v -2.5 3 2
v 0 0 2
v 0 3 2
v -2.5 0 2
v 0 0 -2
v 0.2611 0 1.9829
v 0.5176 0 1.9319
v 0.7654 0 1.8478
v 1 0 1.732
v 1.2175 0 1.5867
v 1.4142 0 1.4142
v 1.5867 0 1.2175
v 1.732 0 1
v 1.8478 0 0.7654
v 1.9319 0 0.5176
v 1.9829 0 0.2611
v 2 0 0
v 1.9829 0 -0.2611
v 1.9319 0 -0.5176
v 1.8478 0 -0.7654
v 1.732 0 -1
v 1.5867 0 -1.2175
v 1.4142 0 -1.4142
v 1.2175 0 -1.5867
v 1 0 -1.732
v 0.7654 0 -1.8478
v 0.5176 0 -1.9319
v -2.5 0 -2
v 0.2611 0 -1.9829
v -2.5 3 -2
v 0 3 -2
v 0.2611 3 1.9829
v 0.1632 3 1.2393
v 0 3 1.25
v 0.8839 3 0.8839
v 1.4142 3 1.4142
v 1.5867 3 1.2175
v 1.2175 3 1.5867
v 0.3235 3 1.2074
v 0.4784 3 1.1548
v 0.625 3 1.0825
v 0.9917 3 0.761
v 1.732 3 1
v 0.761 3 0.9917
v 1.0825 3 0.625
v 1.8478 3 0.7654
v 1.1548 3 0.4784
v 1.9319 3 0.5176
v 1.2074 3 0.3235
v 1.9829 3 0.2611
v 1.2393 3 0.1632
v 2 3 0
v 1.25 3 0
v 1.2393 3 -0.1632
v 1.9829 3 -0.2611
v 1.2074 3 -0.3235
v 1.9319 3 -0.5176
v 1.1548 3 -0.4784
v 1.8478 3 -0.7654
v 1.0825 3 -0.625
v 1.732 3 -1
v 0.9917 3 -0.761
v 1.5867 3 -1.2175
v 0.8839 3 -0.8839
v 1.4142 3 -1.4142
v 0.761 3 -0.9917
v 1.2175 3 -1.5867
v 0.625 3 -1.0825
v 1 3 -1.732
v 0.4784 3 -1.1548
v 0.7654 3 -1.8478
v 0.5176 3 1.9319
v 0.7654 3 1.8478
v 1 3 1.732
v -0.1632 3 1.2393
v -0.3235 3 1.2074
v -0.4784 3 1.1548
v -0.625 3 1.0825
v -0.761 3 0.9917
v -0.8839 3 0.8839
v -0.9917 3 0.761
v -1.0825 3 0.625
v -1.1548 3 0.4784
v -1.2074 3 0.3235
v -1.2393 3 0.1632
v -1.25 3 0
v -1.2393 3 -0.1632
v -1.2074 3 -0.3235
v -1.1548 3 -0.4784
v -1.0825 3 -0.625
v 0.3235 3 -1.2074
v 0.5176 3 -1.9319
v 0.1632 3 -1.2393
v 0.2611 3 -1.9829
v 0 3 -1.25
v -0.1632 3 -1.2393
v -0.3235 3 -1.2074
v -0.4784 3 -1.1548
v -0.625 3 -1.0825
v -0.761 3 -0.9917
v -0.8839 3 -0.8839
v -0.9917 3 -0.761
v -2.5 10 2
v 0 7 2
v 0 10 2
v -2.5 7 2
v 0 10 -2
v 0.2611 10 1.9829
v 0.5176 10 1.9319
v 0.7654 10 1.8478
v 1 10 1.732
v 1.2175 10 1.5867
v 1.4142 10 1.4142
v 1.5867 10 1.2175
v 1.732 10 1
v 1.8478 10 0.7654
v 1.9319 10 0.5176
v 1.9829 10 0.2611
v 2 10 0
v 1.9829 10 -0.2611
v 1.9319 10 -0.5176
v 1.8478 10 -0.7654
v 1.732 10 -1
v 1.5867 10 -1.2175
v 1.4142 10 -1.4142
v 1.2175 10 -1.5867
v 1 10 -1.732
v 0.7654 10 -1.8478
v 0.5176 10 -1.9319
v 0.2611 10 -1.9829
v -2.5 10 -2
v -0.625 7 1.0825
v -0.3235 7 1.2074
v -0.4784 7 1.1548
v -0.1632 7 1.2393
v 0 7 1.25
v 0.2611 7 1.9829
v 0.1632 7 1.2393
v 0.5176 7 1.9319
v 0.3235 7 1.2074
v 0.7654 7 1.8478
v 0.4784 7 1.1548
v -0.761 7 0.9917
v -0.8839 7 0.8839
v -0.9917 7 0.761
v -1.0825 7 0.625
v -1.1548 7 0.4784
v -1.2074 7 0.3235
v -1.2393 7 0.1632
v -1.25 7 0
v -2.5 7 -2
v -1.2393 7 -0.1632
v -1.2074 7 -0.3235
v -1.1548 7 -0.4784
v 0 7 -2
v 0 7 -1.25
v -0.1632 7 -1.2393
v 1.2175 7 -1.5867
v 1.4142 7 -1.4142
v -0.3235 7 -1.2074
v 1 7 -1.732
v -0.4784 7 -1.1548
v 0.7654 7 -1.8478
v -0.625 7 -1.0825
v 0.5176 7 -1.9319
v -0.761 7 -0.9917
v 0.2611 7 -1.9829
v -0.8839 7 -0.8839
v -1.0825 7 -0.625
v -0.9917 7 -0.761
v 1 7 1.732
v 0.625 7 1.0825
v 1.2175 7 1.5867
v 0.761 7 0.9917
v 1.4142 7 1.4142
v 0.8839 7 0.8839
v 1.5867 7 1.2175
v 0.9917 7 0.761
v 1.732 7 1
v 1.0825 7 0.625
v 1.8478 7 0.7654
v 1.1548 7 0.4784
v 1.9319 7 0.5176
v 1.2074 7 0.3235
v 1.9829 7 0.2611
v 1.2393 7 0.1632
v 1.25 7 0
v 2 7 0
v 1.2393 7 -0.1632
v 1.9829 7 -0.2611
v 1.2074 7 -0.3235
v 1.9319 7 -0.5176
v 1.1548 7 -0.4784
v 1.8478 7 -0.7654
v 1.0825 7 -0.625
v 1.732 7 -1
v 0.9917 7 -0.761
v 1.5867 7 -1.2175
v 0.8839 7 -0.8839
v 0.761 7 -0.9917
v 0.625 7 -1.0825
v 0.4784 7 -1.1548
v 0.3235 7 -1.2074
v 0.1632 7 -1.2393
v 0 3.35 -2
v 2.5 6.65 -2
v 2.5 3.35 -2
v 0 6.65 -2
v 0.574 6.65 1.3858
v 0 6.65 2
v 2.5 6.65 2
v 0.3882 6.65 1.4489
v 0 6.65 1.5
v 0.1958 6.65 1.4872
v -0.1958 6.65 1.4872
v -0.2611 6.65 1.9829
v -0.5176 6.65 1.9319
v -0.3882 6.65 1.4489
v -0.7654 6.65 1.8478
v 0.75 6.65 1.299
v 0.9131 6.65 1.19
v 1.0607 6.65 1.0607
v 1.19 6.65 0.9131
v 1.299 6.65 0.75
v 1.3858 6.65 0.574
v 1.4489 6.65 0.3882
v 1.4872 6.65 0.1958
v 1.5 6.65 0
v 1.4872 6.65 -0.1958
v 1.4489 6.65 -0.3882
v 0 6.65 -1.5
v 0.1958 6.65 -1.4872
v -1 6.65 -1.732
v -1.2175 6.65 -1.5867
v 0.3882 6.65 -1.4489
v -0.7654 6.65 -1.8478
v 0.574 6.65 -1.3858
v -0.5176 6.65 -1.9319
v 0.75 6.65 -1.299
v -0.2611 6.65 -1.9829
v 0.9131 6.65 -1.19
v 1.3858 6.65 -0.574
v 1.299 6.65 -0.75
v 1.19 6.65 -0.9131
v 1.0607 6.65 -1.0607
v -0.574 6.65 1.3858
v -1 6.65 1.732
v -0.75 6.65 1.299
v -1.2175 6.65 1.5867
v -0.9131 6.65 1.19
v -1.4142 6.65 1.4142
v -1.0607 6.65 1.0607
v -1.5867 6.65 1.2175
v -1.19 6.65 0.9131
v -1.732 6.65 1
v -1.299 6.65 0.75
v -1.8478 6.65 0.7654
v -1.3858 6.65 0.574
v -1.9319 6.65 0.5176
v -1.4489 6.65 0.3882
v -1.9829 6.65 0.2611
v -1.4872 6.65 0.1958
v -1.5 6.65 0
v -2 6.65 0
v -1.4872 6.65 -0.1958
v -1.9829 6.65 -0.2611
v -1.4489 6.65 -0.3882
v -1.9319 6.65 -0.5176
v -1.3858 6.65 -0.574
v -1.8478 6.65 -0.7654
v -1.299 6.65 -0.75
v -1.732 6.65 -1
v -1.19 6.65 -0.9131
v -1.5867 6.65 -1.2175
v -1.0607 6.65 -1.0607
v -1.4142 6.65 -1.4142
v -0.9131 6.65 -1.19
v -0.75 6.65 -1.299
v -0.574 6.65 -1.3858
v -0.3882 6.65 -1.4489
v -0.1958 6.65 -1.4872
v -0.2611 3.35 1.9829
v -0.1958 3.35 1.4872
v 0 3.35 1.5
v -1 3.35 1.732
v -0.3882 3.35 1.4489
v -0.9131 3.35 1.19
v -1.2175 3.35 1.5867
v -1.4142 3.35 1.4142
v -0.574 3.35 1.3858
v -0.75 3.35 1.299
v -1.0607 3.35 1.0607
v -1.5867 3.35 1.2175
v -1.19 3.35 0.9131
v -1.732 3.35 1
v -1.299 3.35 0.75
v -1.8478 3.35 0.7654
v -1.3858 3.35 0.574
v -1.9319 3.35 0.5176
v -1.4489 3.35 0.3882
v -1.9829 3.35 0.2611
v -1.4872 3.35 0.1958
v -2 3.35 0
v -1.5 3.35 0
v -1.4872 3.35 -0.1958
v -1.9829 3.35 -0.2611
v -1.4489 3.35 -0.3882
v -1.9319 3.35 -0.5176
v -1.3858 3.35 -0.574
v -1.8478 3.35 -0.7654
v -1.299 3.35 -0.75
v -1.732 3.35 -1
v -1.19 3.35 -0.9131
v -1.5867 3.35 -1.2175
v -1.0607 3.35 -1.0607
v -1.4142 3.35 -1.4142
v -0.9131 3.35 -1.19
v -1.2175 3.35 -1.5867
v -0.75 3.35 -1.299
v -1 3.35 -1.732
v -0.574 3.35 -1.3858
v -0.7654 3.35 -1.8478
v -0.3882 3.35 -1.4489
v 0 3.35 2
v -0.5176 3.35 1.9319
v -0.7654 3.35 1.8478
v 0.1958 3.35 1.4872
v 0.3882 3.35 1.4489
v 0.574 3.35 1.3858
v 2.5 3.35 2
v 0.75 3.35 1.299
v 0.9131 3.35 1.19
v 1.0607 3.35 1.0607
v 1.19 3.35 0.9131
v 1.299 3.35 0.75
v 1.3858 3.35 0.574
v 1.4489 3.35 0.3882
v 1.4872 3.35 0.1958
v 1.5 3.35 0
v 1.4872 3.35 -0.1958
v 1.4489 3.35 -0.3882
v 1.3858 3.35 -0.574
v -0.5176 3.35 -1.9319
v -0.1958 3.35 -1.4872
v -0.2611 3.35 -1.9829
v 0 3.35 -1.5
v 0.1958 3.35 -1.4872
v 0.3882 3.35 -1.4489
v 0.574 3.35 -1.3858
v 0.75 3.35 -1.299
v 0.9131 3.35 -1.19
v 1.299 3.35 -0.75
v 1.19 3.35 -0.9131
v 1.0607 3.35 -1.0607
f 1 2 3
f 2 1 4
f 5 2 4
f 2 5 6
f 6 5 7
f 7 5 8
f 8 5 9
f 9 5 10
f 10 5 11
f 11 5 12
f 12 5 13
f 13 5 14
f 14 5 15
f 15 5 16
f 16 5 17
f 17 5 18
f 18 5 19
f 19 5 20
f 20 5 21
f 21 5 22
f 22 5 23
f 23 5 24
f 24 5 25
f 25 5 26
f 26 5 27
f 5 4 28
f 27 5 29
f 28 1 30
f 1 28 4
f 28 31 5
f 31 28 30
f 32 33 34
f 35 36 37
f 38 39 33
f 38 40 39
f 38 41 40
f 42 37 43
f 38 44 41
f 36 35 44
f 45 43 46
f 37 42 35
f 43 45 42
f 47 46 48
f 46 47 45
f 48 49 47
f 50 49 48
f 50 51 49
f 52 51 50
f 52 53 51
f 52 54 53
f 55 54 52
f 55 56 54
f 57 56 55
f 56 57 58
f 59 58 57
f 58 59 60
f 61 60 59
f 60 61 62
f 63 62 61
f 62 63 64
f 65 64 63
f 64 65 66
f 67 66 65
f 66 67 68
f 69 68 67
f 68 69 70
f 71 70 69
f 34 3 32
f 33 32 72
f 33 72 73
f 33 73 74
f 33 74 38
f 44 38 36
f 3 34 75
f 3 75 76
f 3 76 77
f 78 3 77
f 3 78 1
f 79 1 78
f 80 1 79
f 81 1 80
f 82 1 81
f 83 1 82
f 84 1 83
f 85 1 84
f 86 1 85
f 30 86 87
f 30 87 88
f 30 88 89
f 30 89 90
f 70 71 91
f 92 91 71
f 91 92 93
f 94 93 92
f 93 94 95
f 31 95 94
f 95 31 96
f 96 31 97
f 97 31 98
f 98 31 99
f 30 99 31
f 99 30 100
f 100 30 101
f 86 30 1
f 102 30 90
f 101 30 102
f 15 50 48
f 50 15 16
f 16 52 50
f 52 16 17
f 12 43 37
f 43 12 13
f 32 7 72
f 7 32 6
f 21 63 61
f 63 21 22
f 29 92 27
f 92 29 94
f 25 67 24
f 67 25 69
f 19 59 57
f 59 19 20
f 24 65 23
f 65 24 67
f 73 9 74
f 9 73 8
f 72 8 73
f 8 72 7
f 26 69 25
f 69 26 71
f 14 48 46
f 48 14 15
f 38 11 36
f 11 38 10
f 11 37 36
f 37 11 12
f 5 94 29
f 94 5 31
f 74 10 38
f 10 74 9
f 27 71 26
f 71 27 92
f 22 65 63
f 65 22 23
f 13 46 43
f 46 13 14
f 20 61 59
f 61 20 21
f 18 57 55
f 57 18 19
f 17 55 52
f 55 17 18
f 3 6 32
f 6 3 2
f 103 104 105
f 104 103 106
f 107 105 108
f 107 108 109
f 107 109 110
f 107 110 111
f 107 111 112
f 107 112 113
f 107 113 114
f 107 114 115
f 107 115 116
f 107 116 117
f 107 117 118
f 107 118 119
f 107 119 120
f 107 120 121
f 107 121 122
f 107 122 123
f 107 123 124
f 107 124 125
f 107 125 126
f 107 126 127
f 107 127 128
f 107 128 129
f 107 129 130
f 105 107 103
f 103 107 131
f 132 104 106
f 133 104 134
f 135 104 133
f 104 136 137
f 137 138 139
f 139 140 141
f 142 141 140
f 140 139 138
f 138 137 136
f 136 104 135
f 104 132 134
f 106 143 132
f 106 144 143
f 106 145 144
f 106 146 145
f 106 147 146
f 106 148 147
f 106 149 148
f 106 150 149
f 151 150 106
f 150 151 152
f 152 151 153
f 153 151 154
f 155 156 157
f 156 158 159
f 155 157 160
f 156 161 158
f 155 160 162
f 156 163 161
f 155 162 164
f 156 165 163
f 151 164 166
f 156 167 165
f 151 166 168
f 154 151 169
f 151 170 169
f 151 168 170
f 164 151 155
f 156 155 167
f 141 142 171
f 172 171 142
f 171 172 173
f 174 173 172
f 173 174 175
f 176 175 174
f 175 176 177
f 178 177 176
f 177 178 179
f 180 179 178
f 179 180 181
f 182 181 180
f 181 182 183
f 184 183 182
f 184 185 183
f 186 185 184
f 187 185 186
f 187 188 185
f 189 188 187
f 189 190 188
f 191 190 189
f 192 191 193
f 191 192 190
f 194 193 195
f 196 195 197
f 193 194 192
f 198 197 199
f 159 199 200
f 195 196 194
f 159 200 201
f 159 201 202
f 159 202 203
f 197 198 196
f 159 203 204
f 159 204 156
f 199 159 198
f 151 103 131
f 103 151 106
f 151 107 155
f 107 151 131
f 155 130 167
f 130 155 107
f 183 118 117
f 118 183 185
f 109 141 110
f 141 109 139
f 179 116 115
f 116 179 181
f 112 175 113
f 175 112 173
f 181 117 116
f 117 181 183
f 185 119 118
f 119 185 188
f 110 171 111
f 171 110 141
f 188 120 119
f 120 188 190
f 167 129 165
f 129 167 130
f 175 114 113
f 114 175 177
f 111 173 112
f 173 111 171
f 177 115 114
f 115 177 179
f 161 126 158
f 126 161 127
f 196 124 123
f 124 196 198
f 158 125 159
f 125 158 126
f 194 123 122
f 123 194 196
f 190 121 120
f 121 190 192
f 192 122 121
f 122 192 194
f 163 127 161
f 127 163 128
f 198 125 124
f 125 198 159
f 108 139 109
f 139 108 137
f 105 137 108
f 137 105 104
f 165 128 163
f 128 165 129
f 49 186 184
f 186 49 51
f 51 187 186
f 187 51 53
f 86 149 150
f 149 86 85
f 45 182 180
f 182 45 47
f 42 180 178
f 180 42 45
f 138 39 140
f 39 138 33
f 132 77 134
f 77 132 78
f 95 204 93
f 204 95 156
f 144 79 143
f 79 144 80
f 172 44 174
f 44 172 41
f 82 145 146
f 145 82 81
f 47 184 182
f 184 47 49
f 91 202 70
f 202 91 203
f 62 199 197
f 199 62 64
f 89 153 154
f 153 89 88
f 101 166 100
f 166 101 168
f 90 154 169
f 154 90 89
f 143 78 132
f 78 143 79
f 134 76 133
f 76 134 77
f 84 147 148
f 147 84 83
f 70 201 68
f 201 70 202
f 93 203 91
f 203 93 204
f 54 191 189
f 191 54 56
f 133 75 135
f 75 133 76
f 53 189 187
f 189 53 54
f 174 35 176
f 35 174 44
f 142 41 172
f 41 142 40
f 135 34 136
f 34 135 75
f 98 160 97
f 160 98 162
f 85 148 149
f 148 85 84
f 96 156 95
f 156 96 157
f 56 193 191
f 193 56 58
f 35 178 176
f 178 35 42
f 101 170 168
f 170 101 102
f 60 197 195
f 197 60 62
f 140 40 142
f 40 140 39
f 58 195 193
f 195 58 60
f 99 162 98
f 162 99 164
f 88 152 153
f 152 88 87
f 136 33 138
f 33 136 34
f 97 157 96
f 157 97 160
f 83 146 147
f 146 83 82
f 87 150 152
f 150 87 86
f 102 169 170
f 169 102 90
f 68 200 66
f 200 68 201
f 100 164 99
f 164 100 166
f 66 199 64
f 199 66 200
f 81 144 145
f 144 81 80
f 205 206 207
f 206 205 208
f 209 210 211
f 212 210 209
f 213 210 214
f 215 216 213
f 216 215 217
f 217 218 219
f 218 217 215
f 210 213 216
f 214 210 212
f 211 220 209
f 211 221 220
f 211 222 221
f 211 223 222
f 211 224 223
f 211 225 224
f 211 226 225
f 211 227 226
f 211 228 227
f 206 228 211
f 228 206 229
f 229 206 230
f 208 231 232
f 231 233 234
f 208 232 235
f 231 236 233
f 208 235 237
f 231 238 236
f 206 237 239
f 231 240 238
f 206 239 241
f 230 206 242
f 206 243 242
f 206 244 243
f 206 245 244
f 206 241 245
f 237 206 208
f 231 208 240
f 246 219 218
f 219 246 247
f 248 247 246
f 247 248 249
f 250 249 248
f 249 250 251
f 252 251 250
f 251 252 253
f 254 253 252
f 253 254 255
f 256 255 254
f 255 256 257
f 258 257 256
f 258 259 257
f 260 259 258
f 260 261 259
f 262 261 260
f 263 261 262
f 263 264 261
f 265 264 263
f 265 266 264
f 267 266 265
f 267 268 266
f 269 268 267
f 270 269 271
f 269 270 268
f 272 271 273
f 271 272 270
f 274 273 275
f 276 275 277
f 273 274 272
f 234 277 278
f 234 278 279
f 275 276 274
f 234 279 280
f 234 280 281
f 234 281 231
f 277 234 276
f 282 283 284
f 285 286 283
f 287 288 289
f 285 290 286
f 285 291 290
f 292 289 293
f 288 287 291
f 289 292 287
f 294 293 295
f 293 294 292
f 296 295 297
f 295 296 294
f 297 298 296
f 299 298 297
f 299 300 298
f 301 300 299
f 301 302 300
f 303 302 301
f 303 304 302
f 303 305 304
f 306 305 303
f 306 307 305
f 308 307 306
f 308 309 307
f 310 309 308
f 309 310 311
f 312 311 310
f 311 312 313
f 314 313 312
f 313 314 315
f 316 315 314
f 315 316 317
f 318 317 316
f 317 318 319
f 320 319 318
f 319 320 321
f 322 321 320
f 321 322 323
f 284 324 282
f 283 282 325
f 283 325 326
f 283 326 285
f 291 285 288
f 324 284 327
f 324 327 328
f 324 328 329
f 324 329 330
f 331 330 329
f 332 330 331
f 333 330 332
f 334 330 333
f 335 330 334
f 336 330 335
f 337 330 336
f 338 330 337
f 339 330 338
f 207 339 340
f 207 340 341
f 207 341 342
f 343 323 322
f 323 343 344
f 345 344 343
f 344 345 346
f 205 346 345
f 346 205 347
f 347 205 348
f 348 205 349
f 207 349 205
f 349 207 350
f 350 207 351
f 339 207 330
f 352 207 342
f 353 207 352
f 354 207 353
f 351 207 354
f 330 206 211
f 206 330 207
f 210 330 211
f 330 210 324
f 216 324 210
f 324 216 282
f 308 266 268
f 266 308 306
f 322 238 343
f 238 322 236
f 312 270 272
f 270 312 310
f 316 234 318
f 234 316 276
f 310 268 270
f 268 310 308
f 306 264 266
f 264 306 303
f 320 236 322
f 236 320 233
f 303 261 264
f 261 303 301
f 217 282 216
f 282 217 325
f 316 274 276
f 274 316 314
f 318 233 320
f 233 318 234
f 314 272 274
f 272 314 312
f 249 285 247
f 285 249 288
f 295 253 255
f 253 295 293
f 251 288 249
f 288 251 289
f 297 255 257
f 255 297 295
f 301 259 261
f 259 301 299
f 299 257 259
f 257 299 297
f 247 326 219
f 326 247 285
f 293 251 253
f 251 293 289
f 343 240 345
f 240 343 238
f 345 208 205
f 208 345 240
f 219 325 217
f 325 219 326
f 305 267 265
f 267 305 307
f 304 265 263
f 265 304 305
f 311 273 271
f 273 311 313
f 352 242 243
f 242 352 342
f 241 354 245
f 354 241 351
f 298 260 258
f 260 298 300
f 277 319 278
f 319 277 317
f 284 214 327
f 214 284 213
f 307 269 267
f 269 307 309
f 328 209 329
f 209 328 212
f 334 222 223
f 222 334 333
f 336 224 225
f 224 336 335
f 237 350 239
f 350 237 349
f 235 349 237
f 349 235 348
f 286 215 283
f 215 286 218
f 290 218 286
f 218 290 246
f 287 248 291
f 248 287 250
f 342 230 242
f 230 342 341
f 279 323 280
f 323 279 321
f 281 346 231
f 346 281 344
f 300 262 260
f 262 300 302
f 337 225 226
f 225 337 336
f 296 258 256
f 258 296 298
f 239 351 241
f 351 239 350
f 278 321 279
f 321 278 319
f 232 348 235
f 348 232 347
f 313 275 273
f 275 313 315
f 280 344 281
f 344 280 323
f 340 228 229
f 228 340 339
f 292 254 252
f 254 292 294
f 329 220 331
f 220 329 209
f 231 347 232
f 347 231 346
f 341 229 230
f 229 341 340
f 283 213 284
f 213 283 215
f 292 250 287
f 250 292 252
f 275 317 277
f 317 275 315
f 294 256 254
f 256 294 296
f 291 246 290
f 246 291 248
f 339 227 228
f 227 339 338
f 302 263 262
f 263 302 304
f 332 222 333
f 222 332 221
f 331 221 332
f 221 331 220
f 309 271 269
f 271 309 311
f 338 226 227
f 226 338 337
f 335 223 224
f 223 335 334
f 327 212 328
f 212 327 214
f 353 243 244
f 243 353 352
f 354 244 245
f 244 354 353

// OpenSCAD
length = 35;
height = 4;
width = 10;

screw_pre_hole_d = 7.95;
screw_hole_floor_h = 1;
screw_hole_d = 5.45;

hinge = true;

$fn = 48;

module screw_hole () {
    pre_hole_h = height-screw_hole_floor_h;
    translate([0,0,screw_hole_floor_h])
    cylinder(r=screw_pre_hole_d/2, h=pre_hole_h+0.01);
    
    translate([0,0,-0.01])
    cylinder(r=screw_hole_d/2, h=height);
}

module hinge () {
    radius=height/2;
    block_width=2.50;
    union() {
        width=3;
        translate([0, 1.5]) {
            translate([-block_width/2, 0])
            rotate([0,0,90])
            cube([width, block_width, height], center=true);
            rotate([90]) cylinder(r=radius, h=width, center=true);
        }
        translate([0,10-1.5]) {
            translate([-block_width/2, 0])
            rotate([0,0,90])
            cube([width, block_width, height], center=true);
            rotate([90]) cylinder(r=radius, h=width, center=true);
        }
        translate([0, 5])
        rotate([90])
        cylinder(r=1.25, h=10, center=true);
    }
    translate([0,5]) {
        width=3.3;
        rotate([0, 180]) {
            difference() {
                union () {
                    translate([-block_width/2, 0])
                    rotate([0,0,90])
                    cube([width, block_width, height], center=true);
                    rotate([90]) cylinder(r=radius, h=width, center=true);
                }
                rotate([90]) cylinder(r=radius-0.5, h=width+0.01, center=true);
            }
        }
    }
}

module connector (with_hinge=false) {
    difference() {
        middle_length = length - width;
        union() {
            cube([middle_length, width, height]);

            end_radius = width/2;
            translate([0, end_radius])
            cylinder(r=end_radius, h=height);

            translate([middle_length, end_radius])
            cylinder(r=end_radius, h=height);
        }
        translate([0, width/2]) screw_hole();
        translate([middle_length, width/2]) screw_hole();
    }
}

hinge();
// connector(with_hinge=hinge);
